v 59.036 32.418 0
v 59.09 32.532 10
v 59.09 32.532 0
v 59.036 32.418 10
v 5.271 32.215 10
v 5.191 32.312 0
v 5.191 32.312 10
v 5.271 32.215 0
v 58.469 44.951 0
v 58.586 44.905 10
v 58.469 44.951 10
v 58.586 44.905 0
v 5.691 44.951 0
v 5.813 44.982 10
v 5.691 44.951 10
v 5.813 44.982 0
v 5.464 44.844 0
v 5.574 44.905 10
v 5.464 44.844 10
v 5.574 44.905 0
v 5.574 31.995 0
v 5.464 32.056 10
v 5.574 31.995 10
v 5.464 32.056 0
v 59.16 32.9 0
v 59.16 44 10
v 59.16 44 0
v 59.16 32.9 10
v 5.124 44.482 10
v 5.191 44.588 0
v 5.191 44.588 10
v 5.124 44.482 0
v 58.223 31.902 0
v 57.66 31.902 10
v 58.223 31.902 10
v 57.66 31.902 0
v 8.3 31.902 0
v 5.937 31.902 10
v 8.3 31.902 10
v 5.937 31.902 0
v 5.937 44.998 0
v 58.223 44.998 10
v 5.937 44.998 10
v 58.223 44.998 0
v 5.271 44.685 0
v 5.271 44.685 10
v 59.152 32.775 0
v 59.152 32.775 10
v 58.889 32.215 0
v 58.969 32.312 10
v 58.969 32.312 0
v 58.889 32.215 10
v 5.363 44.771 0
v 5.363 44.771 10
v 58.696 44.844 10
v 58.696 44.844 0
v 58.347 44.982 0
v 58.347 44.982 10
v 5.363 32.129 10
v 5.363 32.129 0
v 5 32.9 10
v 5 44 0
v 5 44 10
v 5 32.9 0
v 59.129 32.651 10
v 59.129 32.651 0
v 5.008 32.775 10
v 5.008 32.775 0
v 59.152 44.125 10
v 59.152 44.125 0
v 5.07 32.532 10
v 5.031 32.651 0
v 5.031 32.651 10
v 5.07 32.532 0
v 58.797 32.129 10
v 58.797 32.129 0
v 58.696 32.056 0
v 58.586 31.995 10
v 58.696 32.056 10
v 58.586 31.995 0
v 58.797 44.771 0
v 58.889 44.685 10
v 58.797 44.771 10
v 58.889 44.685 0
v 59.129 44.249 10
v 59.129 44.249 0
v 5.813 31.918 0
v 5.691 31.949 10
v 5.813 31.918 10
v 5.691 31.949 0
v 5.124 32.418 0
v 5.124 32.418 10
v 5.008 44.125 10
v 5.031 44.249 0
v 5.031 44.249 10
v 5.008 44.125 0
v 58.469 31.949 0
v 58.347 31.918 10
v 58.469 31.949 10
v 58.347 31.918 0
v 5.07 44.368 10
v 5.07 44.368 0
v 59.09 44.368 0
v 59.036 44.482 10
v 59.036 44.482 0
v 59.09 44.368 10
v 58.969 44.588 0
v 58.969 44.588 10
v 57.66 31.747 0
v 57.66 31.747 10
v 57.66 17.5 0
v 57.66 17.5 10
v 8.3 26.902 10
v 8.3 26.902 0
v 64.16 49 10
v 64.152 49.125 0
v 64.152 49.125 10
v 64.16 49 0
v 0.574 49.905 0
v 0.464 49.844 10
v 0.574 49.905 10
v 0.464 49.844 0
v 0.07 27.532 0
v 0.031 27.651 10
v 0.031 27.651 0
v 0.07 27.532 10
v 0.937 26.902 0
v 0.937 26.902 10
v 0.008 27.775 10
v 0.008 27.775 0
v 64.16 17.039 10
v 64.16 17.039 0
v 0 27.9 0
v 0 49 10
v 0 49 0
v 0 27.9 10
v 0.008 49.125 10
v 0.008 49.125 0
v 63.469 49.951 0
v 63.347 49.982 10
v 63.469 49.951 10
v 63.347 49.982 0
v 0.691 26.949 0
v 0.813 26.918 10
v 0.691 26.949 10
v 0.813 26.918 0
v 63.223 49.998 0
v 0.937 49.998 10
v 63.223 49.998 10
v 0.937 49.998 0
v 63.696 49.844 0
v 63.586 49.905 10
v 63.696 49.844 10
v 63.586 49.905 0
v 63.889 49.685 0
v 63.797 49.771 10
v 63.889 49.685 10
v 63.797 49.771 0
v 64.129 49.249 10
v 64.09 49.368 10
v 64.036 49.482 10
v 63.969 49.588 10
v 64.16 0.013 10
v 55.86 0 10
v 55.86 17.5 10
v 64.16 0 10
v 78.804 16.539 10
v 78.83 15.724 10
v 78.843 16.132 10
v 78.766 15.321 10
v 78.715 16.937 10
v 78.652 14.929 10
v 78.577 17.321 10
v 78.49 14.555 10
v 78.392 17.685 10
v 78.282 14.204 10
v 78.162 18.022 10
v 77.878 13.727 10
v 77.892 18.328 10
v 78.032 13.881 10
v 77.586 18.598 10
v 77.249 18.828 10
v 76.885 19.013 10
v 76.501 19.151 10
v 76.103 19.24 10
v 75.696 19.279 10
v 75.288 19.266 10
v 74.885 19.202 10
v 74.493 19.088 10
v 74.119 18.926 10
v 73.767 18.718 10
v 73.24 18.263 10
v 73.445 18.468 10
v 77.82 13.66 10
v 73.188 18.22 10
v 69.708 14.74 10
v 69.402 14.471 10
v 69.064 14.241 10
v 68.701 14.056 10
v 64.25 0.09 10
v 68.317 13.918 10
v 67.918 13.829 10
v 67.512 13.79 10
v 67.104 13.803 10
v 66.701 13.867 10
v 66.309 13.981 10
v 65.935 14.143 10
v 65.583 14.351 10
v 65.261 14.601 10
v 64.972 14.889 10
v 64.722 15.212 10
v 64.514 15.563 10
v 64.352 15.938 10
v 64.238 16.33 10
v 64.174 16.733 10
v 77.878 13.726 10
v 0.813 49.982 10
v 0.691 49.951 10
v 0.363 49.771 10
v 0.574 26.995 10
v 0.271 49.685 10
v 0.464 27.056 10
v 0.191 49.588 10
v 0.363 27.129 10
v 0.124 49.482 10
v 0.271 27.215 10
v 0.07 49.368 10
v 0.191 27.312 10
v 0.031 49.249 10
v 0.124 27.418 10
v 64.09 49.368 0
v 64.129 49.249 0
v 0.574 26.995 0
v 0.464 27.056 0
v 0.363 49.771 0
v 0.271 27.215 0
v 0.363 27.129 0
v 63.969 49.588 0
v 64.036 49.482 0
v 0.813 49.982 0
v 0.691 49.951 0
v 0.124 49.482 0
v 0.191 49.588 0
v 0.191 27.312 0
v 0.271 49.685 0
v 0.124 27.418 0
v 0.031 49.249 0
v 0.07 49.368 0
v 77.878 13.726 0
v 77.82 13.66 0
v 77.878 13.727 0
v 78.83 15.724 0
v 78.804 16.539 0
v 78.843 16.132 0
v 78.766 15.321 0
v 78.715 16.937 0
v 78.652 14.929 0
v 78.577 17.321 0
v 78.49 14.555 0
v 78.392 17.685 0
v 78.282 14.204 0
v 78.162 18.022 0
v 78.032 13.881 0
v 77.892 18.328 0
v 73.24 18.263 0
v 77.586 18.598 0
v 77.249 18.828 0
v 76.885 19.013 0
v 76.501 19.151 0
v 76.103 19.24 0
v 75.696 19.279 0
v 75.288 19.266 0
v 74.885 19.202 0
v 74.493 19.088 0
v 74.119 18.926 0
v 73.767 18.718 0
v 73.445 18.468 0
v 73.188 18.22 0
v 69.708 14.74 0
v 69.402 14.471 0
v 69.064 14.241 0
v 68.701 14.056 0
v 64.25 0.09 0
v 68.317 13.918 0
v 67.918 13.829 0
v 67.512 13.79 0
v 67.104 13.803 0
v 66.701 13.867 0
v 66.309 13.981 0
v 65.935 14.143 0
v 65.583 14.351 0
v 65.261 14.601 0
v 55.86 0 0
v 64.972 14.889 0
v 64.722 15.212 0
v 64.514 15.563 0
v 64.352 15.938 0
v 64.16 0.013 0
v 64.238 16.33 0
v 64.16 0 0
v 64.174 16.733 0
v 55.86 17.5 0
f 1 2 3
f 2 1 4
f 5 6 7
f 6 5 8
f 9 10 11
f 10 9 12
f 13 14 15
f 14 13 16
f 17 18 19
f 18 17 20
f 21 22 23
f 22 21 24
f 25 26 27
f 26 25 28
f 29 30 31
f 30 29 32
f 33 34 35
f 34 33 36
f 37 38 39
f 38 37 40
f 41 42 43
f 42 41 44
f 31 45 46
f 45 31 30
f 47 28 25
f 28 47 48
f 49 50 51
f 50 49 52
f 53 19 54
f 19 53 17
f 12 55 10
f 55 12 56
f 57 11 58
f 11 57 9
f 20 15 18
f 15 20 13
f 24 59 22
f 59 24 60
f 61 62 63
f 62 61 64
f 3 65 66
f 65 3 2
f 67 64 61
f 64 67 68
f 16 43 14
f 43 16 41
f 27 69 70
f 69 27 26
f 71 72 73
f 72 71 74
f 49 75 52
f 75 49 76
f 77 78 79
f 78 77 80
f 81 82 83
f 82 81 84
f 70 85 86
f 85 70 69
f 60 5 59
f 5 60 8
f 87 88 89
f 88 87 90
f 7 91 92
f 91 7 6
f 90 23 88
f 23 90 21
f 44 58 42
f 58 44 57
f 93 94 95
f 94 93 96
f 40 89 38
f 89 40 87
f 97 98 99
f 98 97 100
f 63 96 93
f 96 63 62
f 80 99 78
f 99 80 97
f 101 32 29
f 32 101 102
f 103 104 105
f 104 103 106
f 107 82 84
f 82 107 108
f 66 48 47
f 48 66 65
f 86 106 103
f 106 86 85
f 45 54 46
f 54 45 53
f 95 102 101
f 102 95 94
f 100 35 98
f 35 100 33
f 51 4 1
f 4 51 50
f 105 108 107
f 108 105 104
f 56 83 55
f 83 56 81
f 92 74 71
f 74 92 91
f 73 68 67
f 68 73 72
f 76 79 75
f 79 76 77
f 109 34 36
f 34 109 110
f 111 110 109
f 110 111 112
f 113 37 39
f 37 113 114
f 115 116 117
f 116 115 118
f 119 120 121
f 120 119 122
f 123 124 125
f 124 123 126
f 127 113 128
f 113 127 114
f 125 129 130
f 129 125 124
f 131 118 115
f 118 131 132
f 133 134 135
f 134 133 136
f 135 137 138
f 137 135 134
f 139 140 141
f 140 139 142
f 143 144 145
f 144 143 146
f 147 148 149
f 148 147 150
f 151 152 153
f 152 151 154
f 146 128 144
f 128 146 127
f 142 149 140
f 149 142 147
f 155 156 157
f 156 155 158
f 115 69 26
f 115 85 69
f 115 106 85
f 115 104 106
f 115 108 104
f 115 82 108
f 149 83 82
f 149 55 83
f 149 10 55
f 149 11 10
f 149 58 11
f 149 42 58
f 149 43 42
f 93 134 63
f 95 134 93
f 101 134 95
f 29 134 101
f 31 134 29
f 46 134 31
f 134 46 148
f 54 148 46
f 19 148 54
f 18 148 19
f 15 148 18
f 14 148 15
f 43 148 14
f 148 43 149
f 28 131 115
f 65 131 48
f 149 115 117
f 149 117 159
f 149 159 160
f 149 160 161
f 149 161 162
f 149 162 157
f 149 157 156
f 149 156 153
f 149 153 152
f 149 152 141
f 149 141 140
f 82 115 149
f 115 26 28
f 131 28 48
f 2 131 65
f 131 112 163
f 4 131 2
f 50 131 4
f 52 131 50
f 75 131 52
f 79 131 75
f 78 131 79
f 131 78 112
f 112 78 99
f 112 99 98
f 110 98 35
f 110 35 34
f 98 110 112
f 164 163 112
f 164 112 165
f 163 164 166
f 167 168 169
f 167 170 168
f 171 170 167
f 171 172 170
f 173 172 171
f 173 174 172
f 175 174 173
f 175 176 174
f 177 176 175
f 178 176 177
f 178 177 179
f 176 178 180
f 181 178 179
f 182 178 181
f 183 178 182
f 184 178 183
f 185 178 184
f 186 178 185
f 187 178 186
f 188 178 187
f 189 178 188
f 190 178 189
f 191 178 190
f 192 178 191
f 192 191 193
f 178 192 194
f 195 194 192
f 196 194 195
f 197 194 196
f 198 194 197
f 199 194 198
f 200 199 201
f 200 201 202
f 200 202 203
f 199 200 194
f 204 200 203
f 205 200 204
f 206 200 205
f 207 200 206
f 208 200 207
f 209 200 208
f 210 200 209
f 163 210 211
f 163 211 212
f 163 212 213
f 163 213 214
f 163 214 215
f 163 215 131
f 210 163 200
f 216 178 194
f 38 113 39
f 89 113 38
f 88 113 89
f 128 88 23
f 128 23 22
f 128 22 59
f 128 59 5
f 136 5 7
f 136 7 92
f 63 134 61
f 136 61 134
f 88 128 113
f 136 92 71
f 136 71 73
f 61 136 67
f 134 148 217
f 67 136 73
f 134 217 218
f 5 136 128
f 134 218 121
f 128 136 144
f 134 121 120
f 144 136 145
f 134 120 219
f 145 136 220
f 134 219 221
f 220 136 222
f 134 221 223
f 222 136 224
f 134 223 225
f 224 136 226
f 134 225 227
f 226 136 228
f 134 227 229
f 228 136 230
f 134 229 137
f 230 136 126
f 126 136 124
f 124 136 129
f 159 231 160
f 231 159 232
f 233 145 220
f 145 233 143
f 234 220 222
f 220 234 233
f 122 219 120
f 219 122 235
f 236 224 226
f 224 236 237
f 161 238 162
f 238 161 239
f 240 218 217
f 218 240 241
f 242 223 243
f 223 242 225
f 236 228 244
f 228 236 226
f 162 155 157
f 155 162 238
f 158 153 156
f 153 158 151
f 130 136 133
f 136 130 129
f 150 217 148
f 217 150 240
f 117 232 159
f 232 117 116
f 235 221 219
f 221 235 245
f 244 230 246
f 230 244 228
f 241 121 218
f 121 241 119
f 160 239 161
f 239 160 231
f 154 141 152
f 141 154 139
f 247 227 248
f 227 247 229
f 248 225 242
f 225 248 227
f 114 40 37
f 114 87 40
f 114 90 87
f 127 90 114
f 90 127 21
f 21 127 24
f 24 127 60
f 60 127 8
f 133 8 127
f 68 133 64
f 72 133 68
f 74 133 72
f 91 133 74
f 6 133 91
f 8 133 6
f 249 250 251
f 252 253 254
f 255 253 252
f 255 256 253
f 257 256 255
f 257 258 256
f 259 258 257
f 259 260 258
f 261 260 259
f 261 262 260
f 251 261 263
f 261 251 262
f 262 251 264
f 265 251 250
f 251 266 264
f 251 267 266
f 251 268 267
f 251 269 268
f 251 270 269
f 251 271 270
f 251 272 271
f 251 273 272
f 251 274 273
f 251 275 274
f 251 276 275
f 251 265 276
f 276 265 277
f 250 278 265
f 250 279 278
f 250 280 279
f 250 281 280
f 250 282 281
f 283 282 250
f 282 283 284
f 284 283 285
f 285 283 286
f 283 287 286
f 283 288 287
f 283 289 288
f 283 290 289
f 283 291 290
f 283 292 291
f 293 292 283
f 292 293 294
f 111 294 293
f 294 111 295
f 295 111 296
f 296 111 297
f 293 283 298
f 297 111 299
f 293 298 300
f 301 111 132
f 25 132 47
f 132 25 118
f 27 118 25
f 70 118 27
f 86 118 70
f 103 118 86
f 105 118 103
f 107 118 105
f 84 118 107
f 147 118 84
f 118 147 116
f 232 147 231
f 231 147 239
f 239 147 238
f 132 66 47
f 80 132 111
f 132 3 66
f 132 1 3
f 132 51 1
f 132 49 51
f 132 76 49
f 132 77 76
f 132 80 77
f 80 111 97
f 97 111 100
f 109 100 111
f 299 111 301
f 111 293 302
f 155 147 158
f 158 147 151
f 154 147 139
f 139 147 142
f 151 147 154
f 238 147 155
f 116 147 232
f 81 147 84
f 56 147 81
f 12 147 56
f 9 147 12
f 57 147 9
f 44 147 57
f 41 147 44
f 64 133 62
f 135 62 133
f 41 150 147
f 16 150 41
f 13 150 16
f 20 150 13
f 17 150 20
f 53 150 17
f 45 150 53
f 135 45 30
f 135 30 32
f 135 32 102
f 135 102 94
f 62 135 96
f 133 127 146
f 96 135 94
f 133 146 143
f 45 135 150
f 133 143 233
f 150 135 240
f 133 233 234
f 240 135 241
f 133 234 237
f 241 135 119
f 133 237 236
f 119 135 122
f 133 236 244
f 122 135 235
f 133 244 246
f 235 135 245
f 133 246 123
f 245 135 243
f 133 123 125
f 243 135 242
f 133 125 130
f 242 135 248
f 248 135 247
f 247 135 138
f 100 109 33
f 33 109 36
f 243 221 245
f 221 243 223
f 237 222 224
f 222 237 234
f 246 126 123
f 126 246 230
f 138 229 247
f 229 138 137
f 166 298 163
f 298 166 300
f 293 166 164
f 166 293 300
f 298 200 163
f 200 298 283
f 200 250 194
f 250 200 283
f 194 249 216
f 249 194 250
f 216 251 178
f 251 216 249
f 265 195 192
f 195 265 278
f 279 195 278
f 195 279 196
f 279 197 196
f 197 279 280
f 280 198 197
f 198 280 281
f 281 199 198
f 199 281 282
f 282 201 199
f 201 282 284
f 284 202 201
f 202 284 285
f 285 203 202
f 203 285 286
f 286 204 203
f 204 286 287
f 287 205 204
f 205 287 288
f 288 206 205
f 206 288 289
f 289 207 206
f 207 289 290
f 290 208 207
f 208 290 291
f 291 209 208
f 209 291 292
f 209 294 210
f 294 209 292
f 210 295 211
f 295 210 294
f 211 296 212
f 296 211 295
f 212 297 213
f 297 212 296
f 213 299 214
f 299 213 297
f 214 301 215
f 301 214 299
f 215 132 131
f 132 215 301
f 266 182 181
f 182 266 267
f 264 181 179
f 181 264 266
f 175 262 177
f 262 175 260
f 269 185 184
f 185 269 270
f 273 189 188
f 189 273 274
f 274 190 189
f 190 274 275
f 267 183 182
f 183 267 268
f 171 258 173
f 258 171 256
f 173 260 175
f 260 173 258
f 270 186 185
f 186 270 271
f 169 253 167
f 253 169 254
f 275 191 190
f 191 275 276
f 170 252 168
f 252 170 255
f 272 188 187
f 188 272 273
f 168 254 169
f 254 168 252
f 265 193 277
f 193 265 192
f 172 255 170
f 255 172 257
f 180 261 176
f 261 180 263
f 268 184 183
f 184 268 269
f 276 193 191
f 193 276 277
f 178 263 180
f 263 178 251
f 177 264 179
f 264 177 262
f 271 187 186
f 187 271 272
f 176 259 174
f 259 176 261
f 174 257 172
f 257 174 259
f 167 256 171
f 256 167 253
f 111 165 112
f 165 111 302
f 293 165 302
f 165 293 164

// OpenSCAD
// Hook width (mm)
hook_width = 10; //[1:30]

/* [Hidden] */
$fn = 50;

eps = 0.5;
wd = 53.66 + eps;   // width of the cubicle top bar
wliph = 12.6 + eps; // height of the cubicle top bar
inset = 2.8 + eps;  // inset from the top bar to the cube wall

hookw = hook_width;     // width of the hook
r = 1.0;        // fillet radius of the cutout
hookh = 50;     // total height of the hook
hookendl = 12+(hookw-3)/2;  // distance out from hook
t = 5;          // thickness of the hook walls
tt = t+1.5;     // thickness of tip part
ang = 45;       // angle of the tip
hr = tt/2;      // hook fillet radius

module roundbox(bl,bw,bh,br) {
    hull() {
        translate([br,br,0]) cylinder(bh,br,br);
        translate([bl-br,br,0]) cylinder(bh,br,br);
        translate([bl-br,bw-br,0]) cylinder(bh,br,br);
        translate([br,bw-br,0]) cylinder(bh,br,br);
    }
}

module wall() {
    translate([0,hookw,hookh-t-wliph]) rotate([90,0,0]) roundbox(wd,wliph,hookw,r);
    translate([inset,0,0]) cube([wd-inset-1.5,hookw,hookh-t-wliph+1]);
    translate([-t-1,0,0]) cube([t+inset+1,hookw,hookh-wliph-2*t]);
}

module hook() {
    difference() {
        translate([0,hookw,hookh-wliph-2*t]) rotate([90,0,0]) roundbox(wd+2*t,wliph+2*t,hookw,1);
        translate([t,-1,0]) scale([1,2,1]) wall();
    }
    translate([wd+t,0,0]) cube([t,hookw,2]);
    // upward bend
    translate([wd+2*t,hookw,0]) rotate([90,0,0]) linear_extrude(hookw) offset(r=-hr) offset(r=hr) union() {
        translate([-tt,0,0]) square([tt,hookh-t-wliph]);
        rotate([0,0,-ang]) translate([-tt,0,0]) square([tt,hookendl/cos(ang)-t/2]);
    }
}

module hooktip() {
    translate([hookendl/cos(ang)-t/2,hookw,tt/2]) rotate([90,0,0]) cylinder(hookw,d=tt,d=tt);
}

module wholehook() {
    hook();
    translate([wd+2*t,0,0]) rotate([0,-ang,0]) hooktip();
    // inset on backside of hook
    translate([wd+t-inset,0,0]) cube([t,hookw,17.5]);
}

translate([0,0,hookw]) rotate([-90,0,0]) wholehook();
